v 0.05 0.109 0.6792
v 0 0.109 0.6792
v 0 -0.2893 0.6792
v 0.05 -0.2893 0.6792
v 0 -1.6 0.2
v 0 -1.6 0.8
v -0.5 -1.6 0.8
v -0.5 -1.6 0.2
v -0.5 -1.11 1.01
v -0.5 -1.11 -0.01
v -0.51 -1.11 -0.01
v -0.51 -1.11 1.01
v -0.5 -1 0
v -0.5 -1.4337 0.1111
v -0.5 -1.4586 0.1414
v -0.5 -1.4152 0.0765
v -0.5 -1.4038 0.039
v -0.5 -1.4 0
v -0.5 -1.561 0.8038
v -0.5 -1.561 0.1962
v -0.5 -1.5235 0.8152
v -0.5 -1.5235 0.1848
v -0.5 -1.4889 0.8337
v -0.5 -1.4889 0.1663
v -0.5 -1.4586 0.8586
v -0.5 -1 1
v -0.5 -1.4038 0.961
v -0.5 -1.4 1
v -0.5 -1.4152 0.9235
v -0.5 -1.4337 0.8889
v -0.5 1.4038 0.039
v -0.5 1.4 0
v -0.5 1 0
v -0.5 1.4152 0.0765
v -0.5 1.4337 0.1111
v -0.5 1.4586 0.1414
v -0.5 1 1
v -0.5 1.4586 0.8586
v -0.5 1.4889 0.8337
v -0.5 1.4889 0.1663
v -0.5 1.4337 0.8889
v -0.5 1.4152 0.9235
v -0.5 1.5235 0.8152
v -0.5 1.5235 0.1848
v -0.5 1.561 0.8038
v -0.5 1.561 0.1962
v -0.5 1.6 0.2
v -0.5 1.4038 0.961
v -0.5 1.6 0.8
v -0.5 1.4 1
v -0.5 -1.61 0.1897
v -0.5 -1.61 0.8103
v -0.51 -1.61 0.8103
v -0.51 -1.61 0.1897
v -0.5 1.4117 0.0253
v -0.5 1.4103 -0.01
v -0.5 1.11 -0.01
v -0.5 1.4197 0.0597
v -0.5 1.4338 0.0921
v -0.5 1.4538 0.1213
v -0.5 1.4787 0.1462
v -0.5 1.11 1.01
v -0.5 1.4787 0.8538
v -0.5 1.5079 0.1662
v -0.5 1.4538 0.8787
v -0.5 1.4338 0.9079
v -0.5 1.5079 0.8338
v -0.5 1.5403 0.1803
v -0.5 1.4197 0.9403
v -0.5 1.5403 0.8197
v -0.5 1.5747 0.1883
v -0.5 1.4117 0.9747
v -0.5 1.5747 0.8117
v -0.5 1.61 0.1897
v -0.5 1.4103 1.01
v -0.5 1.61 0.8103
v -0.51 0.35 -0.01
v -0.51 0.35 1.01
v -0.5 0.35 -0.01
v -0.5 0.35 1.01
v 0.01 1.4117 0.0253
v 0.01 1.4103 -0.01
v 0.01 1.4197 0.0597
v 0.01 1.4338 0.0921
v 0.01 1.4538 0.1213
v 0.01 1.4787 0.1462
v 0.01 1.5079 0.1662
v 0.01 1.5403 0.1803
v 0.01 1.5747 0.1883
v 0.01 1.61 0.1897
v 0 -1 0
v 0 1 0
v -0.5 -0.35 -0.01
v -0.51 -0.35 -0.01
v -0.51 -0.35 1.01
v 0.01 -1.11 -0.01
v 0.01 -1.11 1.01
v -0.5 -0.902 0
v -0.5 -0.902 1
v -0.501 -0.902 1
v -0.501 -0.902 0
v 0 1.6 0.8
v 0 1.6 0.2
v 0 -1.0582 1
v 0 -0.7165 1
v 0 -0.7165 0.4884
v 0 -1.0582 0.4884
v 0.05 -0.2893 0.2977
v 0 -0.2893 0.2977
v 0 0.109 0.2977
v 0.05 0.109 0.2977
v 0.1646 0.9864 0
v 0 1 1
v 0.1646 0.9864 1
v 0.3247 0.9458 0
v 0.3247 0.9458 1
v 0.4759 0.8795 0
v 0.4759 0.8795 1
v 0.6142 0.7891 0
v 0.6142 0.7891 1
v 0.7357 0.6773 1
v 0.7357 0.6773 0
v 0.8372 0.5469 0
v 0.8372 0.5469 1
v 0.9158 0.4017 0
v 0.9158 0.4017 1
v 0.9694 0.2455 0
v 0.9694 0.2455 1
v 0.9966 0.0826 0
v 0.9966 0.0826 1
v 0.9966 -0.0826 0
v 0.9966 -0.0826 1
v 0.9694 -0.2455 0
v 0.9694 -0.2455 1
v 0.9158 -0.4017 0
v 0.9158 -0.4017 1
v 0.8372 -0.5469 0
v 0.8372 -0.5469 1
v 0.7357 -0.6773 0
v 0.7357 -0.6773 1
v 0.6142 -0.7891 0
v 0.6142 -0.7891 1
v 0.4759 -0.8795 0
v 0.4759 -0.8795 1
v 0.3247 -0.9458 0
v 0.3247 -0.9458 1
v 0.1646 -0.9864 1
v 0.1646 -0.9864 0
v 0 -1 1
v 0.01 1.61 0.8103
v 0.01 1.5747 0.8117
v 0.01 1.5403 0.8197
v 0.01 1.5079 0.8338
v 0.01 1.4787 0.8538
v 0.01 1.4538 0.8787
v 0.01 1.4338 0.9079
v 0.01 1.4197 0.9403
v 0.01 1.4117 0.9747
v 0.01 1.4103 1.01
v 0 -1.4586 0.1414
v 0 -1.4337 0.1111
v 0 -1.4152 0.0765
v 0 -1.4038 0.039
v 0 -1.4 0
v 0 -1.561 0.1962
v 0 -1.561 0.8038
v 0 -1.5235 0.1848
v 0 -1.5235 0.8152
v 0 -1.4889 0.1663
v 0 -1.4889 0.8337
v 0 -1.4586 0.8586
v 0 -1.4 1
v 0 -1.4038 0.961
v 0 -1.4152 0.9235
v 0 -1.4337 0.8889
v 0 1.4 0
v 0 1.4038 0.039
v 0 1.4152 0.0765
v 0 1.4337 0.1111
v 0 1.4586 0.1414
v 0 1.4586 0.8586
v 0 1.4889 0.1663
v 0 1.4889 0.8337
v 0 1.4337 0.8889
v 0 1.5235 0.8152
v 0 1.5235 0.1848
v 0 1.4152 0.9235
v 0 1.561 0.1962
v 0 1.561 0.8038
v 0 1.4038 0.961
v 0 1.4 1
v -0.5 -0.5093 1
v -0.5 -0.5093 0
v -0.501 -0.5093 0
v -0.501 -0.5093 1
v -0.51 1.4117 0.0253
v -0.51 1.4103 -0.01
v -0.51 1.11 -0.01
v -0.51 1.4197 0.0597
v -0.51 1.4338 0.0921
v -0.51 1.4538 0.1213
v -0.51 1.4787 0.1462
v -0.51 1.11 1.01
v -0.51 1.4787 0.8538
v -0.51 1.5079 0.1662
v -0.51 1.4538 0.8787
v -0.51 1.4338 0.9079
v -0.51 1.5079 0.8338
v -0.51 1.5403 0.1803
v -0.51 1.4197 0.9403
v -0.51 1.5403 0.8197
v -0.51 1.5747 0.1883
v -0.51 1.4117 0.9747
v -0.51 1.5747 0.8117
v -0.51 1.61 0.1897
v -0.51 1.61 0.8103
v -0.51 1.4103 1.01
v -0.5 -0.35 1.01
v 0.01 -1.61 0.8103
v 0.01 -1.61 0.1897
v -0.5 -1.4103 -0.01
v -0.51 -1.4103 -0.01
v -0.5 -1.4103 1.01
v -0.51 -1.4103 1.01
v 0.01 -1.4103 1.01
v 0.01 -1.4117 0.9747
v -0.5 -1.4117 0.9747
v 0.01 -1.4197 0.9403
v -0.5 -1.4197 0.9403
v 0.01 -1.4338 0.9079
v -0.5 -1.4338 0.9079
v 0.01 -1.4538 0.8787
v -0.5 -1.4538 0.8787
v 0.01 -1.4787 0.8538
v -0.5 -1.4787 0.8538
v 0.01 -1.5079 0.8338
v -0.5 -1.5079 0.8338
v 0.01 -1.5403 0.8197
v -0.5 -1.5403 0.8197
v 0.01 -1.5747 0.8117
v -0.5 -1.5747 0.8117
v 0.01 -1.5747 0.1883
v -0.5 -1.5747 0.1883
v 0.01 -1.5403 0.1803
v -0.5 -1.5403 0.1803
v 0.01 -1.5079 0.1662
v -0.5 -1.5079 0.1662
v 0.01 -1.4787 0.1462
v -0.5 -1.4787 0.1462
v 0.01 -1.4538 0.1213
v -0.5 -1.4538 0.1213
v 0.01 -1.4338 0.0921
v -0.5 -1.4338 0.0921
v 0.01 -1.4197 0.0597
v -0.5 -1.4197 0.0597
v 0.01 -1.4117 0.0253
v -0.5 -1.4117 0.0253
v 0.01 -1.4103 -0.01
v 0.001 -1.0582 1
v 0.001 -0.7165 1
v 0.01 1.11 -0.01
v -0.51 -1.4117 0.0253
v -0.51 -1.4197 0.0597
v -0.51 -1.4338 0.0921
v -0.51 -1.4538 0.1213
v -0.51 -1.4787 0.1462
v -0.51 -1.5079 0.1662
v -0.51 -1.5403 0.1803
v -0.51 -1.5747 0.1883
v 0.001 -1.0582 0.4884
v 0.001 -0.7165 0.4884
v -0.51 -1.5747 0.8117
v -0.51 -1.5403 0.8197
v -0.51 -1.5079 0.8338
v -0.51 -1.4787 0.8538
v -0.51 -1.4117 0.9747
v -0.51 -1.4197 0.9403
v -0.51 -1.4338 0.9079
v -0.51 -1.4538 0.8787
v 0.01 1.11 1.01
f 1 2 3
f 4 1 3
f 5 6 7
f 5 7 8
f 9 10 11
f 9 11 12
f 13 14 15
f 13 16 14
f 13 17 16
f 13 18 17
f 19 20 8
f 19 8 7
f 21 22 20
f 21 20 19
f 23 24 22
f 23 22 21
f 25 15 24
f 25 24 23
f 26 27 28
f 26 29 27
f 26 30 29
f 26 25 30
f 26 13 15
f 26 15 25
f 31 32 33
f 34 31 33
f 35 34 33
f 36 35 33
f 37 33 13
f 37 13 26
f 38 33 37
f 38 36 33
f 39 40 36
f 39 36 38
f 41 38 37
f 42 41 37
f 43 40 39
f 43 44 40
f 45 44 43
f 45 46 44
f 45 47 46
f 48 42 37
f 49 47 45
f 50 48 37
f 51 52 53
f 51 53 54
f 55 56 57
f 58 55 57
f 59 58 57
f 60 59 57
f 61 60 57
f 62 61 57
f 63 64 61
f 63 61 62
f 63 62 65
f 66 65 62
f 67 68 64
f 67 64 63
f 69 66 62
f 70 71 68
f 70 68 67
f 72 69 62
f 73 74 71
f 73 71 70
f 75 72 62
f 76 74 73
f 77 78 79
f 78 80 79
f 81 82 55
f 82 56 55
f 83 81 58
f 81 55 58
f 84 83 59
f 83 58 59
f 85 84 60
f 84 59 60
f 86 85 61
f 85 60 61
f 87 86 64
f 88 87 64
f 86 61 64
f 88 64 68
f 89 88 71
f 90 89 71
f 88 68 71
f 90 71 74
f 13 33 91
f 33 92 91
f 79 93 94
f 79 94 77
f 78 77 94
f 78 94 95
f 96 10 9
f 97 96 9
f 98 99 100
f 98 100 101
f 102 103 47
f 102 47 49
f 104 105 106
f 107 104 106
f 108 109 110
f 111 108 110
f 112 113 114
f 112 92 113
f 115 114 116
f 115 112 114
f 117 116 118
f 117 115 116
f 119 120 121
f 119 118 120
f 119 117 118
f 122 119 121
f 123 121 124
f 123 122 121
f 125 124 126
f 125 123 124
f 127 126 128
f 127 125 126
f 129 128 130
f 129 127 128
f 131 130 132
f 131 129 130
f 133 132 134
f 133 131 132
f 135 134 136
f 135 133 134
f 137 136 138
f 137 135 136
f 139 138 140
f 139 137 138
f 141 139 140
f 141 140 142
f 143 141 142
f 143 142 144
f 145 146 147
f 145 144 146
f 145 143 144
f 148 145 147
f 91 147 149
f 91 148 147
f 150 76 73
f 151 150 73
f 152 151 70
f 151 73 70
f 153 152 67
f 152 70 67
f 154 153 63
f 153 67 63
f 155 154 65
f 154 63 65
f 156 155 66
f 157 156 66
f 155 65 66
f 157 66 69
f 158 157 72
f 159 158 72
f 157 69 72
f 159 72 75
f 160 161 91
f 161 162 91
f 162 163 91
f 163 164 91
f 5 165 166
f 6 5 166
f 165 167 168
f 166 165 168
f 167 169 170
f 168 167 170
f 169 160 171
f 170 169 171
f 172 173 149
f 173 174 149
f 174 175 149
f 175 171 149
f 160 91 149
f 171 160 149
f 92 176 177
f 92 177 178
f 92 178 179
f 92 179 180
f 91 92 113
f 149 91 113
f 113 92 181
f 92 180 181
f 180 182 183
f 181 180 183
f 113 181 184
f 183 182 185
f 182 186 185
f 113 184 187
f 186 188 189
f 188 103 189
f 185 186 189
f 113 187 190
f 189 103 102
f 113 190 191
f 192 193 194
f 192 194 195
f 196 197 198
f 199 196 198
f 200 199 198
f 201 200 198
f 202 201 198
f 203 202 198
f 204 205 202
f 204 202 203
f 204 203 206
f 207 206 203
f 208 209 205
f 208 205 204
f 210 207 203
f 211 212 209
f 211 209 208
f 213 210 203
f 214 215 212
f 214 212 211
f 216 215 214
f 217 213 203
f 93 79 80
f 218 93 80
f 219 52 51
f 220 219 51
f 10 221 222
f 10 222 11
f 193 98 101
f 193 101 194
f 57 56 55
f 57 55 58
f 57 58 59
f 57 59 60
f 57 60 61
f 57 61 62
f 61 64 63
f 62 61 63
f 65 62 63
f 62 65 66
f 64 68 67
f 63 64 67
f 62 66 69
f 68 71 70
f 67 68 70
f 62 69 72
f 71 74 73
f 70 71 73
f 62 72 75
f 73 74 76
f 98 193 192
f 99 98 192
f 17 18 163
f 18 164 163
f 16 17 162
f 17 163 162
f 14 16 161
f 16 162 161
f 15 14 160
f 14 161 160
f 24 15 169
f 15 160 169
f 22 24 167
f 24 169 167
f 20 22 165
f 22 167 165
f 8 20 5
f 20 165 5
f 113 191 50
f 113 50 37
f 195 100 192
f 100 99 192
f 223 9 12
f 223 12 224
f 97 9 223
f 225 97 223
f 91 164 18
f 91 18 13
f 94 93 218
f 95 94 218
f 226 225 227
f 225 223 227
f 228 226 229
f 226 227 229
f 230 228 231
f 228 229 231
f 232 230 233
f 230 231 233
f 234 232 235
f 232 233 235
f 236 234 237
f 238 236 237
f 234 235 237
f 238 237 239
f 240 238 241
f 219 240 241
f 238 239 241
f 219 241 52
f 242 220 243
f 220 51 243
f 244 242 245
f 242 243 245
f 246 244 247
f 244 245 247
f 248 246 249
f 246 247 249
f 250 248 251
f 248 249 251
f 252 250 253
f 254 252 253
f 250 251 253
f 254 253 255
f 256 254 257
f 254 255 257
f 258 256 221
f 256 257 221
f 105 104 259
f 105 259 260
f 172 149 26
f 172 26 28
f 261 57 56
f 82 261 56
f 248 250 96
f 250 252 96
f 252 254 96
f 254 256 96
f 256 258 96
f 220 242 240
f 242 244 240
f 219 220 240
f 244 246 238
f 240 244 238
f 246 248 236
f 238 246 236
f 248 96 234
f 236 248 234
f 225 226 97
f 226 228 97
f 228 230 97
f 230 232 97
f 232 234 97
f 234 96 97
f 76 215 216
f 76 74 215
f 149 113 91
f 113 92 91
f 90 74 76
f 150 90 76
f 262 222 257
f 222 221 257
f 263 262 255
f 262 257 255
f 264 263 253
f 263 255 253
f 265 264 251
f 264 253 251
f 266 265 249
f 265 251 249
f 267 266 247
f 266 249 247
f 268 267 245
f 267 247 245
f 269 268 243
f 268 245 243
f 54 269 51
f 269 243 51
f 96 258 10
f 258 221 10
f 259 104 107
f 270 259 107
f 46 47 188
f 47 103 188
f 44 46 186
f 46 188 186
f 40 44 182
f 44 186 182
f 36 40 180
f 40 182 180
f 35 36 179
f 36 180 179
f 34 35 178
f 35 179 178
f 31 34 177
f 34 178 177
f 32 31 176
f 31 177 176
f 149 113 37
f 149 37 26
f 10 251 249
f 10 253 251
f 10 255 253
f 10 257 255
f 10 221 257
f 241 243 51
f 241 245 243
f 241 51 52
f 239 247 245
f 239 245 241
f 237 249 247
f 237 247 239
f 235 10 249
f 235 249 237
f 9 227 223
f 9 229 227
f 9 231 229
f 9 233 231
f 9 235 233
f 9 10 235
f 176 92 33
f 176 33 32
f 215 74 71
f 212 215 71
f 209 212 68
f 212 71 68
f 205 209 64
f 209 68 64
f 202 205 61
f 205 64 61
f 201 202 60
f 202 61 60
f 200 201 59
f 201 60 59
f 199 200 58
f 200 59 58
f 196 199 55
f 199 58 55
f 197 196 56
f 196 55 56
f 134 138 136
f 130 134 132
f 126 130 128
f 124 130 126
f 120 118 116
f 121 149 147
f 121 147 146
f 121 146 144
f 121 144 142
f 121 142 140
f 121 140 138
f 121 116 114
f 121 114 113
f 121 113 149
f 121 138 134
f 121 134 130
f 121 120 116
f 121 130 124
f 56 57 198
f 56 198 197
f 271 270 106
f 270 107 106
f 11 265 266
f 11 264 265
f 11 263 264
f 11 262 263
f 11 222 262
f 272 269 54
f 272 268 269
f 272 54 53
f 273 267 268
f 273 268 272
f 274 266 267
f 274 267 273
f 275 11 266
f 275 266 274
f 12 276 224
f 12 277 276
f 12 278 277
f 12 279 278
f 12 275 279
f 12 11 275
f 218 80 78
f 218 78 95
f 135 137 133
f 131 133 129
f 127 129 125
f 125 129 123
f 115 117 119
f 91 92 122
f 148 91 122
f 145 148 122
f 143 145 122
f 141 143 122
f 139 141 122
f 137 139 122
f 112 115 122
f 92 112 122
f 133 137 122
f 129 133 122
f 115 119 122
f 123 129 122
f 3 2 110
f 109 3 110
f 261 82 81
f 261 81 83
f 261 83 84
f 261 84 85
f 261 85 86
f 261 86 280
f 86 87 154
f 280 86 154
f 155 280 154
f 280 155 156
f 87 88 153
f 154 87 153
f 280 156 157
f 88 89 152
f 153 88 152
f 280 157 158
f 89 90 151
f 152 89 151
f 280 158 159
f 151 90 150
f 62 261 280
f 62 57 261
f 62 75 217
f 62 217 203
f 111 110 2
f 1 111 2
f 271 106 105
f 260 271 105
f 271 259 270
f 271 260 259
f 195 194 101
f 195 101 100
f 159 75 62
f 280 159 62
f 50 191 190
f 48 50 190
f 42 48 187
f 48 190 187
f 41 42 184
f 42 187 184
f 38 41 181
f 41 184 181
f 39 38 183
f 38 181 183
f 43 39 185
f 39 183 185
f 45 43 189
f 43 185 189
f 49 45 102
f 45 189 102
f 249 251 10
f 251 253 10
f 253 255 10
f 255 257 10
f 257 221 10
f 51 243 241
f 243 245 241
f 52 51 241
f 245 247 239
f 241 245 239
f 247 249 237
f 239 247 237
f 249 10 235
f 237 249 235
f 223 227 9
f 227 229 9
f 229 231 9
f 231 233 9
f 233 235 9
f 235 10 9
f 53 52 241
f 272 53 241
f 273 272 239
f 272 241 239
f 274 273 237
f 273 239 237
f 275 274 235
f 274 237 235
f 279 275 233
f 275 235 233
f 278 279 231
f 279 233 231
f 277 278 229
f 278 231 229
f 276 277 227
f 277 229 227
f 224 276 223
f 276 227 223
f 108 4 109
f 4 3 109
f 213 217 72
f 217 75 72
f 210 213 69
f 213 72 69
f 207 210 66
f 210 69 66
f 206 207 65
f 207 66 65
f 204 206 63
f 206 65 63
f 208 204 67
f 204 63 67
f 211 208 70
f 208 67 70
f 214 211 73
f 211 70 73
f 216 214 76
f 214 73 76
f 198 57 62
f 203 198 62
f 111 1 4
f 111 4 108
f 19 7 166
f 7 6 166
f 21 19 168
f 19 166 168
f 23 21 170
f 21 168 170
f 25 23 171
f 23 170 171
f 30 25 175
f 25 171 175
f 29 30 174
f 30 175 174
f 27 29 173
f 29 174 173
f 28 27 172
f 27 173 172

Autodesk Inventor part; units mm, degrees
ref_plane "YZ Plane" through (0, 0, 0) normal (1, 0, 0) x (0, 1, 0)
ref_plane "XZ Plane" through (0, 0, 0) normal (0, 1, 0) x (-1, 0, 0)
ref_plane "XY Plane" through (0, 0, 0) normal (0, 0, 1) x (1, 0, 0)
sketch "Sketch1" plane through (0, 0, 0) normal (0, 0, 1) x (1, 0, 0)
  arc A0 (0, -1) -> (0, 1) centre (0, 0) ccw
  line L0 (0, 0) -> (0, 1) construction
  line L1 (0, 0) -> (1, 0) construction
  line L2 (0, 0) -> (0, -1) construction
  line L3 (0, 1) -> (0, -1)
  dimension "d0" = 1
  dimension "d1" = 90
  dimension "d2" = 180
extrude "Extrusion1" add sketch "Sketch1" along normal blind 1
sketch "Sketch2" plane through (0, -1, 0) normal (-1, 0, 0) x (0, 0, 1)
  line L0 (0, 2.6) -> (1, 2.6)
  line L1 (1, 2.6) -> (1, -0.6)
  line L2 (1, -0.6) -> (0, -0.6)
  line L3 (0, -0.6) -> (0, 2.6)
  line L4 (0, 2) -> (0, 0) projected
  line L5 (1, 2) -> (1, 0) projected
  arc A0 (0, 2.4) -> (0.2, 2.6) centre (0, 2.6) ccw
  arc A1 (0.8, 2.6) -> (1, 2.4) centre (1, 2.6) ccw
  arc A2 (1, -0.4) -> (0.8, -0.6) centre (1, -0.6) ccw
  arc A3 (0.2, -0.6) -> (0, -0.4) centre (0, -0.6) ccw
  point P0 (0, 1)
  point P1 (1, 1)
  point P2 (1, 1)
  dimension "d5" = 3.2
  dimension "d6" = 0.2
extrude "Extrusion2" add sketch "Sketch2" along normal blind 0.5 separate body contours L0 A1 L1 A2 L2 A3 L3 A0
sketch "Sketch3" plane through (-0.5, -1, 0) normal (-1, 0, 0) x (0, 0, 1)
  line L0 (0, 2.4) -> (0, -0.4) construction
  arc A0 (0.2, -0.6) -> (0, -0.4) centre (0, -0.6) ccw projected
  line L1 (0.2, -0.6) -> (0.8, -0.6) projected
  arc A1 (1, -0.4) -> (0.8, -0.6) centre (1, -0.6) ccw projected
  line L2 (1, -0.4) -> (1, 2.4) construction
  arc A2 (0.8, 2.6) -> (1, 2.4) centre (1, 2.6) ccw projected
  line L3 (0.8, 2.6) -> (0.2, 2.6) projected
  arc A3 (0, 2.4) -> (0.2, 2.6) centre (0, 2.6) ccw projected
  line L4 (1.01, 2.4103) -> (1.01, -0.4103)
  arc A4 (1.01, -0.4103) -> (0.8103, -0.61) centre (1, -0.6) ccw
  line L5 (0.8103, -0.61) -> (0.1897, -0.61)
  arc A5 (0.1897, -0.61) -> (-0.01, -0.4103) centre (0, -0.6) ccw
  line L6 (-0.01, -0.4103) -> (-0.01, 2.4103)
  arc A6 (-0.01, 2.4103) -> (0.1897, 2.61) centre (0, 2.6) ccw
  line L7 (0.1897, 2.61) -> (0.8103, 2.61)
  arc A7 (0.8103, 2.61) -> (1.01, 2.4103) centre (1, 2.6) ccw
  line L8 (-0.01, 2.11) -> (1.01, 2.11)
  line L9 (-0.01, -0.11) -> (1.01, -0.11)
  line L10 (1.01, 1.35) -> (-0.01, 1.35)
  line L11 (-0.01, 1.35) -> (-0.01, 0.65)
  line L12 (-0.01, 0.65) -> (1.01, 0.65)
  line L13 (1.01, 0.65) -> (1.01, 1.35)
  point P0 (0, 1)
  point P1 (1.01, 1)
  point P2 (1.01, 1)
  dimension "d9" = 0.01
  dimension "d10" = 0.5
  dimension "d11" = 0.5
  dimension "d22" = 0.7
extrude "Extrusion3" add sketch "Sketch3" against normal blind 0.51 separate body contours L4 L8 L6 A6 L7 A7 | L4 A4 L5 A5 L6 L9
extrude "Extrusion4" add sketch "Sketch3" along normal blind 0.01 separate body contours L4 L8 L6 A6 L7 A7 | L4 L12 L6 L10 | L4 A4 L5 A5 L6 L9
sketch "Sketch4" plane through (-0.5, -1, 0) normal (-1, 0, 0) x (0, 0, 1)
  line L0 (1, -0.4) -> (1, 2.4) projected
  line L1 (1, 0) -> (1, 2) projected
  line L2 (1, 0.098) -> (0, 0.098)
  line L3 (0, 0.098) -> (0, 0.4907)
  line L4 (0, 0.4907) -> (1, 0.4907)
  line L5 (1, 0.4907) -> (1, 0.098)
  line L6 (0, 2.4) -> (0, -0.4) projected
  point P0 (0, 1)
  point P1 (1, 1.9835)
extrude "Extrusion5" add sketch "Sketch4" along normal blind 0.001 separate body
sketch "Sketch5" plane through (0, -1, 0) normal (1, 0, 0) x (0, 0, -1)
  line L0 (-1, -0.4) -> (-1, 2.4) projected
  line L1 (-1, -0.0582) -> (-0.4884, -0.0582)
  line L2 (-0.4884, -0.0582) -> (-0.4884, 0.2835)
  line L3 (-0.4884, 0.2835) -> (-1, 0.2835)
  line L4 (-1, 0.2835) -> (-1, -0.0582)
extrude "Extrusion6" add sketch "Sketch5" along normal blind 0.001 bodies 5
sketch "Sketch6" plane through (0, -1, 0) normal (1, 0, 0) x (0, 0, -1)
  line L0 (-0.6792, 0.7107) -> (-0.2977, 0.7107)
  line L1 (-0.2977, 0.7107) -> (-0.2977, 1.109)
  line L2 (-0.2977, 1.109) -> (-0.6792, 1.109)
  line L3 (-0.6792, 1.109) -> (-0.6792, 0.7107)
  point P0 (0, 1)
extrude "Extrusion7" add sketch "Sketch6" along normal blind 0.05 separate body
equation "\"d11\" = d10"
properties part number "LED 3216 RA"
